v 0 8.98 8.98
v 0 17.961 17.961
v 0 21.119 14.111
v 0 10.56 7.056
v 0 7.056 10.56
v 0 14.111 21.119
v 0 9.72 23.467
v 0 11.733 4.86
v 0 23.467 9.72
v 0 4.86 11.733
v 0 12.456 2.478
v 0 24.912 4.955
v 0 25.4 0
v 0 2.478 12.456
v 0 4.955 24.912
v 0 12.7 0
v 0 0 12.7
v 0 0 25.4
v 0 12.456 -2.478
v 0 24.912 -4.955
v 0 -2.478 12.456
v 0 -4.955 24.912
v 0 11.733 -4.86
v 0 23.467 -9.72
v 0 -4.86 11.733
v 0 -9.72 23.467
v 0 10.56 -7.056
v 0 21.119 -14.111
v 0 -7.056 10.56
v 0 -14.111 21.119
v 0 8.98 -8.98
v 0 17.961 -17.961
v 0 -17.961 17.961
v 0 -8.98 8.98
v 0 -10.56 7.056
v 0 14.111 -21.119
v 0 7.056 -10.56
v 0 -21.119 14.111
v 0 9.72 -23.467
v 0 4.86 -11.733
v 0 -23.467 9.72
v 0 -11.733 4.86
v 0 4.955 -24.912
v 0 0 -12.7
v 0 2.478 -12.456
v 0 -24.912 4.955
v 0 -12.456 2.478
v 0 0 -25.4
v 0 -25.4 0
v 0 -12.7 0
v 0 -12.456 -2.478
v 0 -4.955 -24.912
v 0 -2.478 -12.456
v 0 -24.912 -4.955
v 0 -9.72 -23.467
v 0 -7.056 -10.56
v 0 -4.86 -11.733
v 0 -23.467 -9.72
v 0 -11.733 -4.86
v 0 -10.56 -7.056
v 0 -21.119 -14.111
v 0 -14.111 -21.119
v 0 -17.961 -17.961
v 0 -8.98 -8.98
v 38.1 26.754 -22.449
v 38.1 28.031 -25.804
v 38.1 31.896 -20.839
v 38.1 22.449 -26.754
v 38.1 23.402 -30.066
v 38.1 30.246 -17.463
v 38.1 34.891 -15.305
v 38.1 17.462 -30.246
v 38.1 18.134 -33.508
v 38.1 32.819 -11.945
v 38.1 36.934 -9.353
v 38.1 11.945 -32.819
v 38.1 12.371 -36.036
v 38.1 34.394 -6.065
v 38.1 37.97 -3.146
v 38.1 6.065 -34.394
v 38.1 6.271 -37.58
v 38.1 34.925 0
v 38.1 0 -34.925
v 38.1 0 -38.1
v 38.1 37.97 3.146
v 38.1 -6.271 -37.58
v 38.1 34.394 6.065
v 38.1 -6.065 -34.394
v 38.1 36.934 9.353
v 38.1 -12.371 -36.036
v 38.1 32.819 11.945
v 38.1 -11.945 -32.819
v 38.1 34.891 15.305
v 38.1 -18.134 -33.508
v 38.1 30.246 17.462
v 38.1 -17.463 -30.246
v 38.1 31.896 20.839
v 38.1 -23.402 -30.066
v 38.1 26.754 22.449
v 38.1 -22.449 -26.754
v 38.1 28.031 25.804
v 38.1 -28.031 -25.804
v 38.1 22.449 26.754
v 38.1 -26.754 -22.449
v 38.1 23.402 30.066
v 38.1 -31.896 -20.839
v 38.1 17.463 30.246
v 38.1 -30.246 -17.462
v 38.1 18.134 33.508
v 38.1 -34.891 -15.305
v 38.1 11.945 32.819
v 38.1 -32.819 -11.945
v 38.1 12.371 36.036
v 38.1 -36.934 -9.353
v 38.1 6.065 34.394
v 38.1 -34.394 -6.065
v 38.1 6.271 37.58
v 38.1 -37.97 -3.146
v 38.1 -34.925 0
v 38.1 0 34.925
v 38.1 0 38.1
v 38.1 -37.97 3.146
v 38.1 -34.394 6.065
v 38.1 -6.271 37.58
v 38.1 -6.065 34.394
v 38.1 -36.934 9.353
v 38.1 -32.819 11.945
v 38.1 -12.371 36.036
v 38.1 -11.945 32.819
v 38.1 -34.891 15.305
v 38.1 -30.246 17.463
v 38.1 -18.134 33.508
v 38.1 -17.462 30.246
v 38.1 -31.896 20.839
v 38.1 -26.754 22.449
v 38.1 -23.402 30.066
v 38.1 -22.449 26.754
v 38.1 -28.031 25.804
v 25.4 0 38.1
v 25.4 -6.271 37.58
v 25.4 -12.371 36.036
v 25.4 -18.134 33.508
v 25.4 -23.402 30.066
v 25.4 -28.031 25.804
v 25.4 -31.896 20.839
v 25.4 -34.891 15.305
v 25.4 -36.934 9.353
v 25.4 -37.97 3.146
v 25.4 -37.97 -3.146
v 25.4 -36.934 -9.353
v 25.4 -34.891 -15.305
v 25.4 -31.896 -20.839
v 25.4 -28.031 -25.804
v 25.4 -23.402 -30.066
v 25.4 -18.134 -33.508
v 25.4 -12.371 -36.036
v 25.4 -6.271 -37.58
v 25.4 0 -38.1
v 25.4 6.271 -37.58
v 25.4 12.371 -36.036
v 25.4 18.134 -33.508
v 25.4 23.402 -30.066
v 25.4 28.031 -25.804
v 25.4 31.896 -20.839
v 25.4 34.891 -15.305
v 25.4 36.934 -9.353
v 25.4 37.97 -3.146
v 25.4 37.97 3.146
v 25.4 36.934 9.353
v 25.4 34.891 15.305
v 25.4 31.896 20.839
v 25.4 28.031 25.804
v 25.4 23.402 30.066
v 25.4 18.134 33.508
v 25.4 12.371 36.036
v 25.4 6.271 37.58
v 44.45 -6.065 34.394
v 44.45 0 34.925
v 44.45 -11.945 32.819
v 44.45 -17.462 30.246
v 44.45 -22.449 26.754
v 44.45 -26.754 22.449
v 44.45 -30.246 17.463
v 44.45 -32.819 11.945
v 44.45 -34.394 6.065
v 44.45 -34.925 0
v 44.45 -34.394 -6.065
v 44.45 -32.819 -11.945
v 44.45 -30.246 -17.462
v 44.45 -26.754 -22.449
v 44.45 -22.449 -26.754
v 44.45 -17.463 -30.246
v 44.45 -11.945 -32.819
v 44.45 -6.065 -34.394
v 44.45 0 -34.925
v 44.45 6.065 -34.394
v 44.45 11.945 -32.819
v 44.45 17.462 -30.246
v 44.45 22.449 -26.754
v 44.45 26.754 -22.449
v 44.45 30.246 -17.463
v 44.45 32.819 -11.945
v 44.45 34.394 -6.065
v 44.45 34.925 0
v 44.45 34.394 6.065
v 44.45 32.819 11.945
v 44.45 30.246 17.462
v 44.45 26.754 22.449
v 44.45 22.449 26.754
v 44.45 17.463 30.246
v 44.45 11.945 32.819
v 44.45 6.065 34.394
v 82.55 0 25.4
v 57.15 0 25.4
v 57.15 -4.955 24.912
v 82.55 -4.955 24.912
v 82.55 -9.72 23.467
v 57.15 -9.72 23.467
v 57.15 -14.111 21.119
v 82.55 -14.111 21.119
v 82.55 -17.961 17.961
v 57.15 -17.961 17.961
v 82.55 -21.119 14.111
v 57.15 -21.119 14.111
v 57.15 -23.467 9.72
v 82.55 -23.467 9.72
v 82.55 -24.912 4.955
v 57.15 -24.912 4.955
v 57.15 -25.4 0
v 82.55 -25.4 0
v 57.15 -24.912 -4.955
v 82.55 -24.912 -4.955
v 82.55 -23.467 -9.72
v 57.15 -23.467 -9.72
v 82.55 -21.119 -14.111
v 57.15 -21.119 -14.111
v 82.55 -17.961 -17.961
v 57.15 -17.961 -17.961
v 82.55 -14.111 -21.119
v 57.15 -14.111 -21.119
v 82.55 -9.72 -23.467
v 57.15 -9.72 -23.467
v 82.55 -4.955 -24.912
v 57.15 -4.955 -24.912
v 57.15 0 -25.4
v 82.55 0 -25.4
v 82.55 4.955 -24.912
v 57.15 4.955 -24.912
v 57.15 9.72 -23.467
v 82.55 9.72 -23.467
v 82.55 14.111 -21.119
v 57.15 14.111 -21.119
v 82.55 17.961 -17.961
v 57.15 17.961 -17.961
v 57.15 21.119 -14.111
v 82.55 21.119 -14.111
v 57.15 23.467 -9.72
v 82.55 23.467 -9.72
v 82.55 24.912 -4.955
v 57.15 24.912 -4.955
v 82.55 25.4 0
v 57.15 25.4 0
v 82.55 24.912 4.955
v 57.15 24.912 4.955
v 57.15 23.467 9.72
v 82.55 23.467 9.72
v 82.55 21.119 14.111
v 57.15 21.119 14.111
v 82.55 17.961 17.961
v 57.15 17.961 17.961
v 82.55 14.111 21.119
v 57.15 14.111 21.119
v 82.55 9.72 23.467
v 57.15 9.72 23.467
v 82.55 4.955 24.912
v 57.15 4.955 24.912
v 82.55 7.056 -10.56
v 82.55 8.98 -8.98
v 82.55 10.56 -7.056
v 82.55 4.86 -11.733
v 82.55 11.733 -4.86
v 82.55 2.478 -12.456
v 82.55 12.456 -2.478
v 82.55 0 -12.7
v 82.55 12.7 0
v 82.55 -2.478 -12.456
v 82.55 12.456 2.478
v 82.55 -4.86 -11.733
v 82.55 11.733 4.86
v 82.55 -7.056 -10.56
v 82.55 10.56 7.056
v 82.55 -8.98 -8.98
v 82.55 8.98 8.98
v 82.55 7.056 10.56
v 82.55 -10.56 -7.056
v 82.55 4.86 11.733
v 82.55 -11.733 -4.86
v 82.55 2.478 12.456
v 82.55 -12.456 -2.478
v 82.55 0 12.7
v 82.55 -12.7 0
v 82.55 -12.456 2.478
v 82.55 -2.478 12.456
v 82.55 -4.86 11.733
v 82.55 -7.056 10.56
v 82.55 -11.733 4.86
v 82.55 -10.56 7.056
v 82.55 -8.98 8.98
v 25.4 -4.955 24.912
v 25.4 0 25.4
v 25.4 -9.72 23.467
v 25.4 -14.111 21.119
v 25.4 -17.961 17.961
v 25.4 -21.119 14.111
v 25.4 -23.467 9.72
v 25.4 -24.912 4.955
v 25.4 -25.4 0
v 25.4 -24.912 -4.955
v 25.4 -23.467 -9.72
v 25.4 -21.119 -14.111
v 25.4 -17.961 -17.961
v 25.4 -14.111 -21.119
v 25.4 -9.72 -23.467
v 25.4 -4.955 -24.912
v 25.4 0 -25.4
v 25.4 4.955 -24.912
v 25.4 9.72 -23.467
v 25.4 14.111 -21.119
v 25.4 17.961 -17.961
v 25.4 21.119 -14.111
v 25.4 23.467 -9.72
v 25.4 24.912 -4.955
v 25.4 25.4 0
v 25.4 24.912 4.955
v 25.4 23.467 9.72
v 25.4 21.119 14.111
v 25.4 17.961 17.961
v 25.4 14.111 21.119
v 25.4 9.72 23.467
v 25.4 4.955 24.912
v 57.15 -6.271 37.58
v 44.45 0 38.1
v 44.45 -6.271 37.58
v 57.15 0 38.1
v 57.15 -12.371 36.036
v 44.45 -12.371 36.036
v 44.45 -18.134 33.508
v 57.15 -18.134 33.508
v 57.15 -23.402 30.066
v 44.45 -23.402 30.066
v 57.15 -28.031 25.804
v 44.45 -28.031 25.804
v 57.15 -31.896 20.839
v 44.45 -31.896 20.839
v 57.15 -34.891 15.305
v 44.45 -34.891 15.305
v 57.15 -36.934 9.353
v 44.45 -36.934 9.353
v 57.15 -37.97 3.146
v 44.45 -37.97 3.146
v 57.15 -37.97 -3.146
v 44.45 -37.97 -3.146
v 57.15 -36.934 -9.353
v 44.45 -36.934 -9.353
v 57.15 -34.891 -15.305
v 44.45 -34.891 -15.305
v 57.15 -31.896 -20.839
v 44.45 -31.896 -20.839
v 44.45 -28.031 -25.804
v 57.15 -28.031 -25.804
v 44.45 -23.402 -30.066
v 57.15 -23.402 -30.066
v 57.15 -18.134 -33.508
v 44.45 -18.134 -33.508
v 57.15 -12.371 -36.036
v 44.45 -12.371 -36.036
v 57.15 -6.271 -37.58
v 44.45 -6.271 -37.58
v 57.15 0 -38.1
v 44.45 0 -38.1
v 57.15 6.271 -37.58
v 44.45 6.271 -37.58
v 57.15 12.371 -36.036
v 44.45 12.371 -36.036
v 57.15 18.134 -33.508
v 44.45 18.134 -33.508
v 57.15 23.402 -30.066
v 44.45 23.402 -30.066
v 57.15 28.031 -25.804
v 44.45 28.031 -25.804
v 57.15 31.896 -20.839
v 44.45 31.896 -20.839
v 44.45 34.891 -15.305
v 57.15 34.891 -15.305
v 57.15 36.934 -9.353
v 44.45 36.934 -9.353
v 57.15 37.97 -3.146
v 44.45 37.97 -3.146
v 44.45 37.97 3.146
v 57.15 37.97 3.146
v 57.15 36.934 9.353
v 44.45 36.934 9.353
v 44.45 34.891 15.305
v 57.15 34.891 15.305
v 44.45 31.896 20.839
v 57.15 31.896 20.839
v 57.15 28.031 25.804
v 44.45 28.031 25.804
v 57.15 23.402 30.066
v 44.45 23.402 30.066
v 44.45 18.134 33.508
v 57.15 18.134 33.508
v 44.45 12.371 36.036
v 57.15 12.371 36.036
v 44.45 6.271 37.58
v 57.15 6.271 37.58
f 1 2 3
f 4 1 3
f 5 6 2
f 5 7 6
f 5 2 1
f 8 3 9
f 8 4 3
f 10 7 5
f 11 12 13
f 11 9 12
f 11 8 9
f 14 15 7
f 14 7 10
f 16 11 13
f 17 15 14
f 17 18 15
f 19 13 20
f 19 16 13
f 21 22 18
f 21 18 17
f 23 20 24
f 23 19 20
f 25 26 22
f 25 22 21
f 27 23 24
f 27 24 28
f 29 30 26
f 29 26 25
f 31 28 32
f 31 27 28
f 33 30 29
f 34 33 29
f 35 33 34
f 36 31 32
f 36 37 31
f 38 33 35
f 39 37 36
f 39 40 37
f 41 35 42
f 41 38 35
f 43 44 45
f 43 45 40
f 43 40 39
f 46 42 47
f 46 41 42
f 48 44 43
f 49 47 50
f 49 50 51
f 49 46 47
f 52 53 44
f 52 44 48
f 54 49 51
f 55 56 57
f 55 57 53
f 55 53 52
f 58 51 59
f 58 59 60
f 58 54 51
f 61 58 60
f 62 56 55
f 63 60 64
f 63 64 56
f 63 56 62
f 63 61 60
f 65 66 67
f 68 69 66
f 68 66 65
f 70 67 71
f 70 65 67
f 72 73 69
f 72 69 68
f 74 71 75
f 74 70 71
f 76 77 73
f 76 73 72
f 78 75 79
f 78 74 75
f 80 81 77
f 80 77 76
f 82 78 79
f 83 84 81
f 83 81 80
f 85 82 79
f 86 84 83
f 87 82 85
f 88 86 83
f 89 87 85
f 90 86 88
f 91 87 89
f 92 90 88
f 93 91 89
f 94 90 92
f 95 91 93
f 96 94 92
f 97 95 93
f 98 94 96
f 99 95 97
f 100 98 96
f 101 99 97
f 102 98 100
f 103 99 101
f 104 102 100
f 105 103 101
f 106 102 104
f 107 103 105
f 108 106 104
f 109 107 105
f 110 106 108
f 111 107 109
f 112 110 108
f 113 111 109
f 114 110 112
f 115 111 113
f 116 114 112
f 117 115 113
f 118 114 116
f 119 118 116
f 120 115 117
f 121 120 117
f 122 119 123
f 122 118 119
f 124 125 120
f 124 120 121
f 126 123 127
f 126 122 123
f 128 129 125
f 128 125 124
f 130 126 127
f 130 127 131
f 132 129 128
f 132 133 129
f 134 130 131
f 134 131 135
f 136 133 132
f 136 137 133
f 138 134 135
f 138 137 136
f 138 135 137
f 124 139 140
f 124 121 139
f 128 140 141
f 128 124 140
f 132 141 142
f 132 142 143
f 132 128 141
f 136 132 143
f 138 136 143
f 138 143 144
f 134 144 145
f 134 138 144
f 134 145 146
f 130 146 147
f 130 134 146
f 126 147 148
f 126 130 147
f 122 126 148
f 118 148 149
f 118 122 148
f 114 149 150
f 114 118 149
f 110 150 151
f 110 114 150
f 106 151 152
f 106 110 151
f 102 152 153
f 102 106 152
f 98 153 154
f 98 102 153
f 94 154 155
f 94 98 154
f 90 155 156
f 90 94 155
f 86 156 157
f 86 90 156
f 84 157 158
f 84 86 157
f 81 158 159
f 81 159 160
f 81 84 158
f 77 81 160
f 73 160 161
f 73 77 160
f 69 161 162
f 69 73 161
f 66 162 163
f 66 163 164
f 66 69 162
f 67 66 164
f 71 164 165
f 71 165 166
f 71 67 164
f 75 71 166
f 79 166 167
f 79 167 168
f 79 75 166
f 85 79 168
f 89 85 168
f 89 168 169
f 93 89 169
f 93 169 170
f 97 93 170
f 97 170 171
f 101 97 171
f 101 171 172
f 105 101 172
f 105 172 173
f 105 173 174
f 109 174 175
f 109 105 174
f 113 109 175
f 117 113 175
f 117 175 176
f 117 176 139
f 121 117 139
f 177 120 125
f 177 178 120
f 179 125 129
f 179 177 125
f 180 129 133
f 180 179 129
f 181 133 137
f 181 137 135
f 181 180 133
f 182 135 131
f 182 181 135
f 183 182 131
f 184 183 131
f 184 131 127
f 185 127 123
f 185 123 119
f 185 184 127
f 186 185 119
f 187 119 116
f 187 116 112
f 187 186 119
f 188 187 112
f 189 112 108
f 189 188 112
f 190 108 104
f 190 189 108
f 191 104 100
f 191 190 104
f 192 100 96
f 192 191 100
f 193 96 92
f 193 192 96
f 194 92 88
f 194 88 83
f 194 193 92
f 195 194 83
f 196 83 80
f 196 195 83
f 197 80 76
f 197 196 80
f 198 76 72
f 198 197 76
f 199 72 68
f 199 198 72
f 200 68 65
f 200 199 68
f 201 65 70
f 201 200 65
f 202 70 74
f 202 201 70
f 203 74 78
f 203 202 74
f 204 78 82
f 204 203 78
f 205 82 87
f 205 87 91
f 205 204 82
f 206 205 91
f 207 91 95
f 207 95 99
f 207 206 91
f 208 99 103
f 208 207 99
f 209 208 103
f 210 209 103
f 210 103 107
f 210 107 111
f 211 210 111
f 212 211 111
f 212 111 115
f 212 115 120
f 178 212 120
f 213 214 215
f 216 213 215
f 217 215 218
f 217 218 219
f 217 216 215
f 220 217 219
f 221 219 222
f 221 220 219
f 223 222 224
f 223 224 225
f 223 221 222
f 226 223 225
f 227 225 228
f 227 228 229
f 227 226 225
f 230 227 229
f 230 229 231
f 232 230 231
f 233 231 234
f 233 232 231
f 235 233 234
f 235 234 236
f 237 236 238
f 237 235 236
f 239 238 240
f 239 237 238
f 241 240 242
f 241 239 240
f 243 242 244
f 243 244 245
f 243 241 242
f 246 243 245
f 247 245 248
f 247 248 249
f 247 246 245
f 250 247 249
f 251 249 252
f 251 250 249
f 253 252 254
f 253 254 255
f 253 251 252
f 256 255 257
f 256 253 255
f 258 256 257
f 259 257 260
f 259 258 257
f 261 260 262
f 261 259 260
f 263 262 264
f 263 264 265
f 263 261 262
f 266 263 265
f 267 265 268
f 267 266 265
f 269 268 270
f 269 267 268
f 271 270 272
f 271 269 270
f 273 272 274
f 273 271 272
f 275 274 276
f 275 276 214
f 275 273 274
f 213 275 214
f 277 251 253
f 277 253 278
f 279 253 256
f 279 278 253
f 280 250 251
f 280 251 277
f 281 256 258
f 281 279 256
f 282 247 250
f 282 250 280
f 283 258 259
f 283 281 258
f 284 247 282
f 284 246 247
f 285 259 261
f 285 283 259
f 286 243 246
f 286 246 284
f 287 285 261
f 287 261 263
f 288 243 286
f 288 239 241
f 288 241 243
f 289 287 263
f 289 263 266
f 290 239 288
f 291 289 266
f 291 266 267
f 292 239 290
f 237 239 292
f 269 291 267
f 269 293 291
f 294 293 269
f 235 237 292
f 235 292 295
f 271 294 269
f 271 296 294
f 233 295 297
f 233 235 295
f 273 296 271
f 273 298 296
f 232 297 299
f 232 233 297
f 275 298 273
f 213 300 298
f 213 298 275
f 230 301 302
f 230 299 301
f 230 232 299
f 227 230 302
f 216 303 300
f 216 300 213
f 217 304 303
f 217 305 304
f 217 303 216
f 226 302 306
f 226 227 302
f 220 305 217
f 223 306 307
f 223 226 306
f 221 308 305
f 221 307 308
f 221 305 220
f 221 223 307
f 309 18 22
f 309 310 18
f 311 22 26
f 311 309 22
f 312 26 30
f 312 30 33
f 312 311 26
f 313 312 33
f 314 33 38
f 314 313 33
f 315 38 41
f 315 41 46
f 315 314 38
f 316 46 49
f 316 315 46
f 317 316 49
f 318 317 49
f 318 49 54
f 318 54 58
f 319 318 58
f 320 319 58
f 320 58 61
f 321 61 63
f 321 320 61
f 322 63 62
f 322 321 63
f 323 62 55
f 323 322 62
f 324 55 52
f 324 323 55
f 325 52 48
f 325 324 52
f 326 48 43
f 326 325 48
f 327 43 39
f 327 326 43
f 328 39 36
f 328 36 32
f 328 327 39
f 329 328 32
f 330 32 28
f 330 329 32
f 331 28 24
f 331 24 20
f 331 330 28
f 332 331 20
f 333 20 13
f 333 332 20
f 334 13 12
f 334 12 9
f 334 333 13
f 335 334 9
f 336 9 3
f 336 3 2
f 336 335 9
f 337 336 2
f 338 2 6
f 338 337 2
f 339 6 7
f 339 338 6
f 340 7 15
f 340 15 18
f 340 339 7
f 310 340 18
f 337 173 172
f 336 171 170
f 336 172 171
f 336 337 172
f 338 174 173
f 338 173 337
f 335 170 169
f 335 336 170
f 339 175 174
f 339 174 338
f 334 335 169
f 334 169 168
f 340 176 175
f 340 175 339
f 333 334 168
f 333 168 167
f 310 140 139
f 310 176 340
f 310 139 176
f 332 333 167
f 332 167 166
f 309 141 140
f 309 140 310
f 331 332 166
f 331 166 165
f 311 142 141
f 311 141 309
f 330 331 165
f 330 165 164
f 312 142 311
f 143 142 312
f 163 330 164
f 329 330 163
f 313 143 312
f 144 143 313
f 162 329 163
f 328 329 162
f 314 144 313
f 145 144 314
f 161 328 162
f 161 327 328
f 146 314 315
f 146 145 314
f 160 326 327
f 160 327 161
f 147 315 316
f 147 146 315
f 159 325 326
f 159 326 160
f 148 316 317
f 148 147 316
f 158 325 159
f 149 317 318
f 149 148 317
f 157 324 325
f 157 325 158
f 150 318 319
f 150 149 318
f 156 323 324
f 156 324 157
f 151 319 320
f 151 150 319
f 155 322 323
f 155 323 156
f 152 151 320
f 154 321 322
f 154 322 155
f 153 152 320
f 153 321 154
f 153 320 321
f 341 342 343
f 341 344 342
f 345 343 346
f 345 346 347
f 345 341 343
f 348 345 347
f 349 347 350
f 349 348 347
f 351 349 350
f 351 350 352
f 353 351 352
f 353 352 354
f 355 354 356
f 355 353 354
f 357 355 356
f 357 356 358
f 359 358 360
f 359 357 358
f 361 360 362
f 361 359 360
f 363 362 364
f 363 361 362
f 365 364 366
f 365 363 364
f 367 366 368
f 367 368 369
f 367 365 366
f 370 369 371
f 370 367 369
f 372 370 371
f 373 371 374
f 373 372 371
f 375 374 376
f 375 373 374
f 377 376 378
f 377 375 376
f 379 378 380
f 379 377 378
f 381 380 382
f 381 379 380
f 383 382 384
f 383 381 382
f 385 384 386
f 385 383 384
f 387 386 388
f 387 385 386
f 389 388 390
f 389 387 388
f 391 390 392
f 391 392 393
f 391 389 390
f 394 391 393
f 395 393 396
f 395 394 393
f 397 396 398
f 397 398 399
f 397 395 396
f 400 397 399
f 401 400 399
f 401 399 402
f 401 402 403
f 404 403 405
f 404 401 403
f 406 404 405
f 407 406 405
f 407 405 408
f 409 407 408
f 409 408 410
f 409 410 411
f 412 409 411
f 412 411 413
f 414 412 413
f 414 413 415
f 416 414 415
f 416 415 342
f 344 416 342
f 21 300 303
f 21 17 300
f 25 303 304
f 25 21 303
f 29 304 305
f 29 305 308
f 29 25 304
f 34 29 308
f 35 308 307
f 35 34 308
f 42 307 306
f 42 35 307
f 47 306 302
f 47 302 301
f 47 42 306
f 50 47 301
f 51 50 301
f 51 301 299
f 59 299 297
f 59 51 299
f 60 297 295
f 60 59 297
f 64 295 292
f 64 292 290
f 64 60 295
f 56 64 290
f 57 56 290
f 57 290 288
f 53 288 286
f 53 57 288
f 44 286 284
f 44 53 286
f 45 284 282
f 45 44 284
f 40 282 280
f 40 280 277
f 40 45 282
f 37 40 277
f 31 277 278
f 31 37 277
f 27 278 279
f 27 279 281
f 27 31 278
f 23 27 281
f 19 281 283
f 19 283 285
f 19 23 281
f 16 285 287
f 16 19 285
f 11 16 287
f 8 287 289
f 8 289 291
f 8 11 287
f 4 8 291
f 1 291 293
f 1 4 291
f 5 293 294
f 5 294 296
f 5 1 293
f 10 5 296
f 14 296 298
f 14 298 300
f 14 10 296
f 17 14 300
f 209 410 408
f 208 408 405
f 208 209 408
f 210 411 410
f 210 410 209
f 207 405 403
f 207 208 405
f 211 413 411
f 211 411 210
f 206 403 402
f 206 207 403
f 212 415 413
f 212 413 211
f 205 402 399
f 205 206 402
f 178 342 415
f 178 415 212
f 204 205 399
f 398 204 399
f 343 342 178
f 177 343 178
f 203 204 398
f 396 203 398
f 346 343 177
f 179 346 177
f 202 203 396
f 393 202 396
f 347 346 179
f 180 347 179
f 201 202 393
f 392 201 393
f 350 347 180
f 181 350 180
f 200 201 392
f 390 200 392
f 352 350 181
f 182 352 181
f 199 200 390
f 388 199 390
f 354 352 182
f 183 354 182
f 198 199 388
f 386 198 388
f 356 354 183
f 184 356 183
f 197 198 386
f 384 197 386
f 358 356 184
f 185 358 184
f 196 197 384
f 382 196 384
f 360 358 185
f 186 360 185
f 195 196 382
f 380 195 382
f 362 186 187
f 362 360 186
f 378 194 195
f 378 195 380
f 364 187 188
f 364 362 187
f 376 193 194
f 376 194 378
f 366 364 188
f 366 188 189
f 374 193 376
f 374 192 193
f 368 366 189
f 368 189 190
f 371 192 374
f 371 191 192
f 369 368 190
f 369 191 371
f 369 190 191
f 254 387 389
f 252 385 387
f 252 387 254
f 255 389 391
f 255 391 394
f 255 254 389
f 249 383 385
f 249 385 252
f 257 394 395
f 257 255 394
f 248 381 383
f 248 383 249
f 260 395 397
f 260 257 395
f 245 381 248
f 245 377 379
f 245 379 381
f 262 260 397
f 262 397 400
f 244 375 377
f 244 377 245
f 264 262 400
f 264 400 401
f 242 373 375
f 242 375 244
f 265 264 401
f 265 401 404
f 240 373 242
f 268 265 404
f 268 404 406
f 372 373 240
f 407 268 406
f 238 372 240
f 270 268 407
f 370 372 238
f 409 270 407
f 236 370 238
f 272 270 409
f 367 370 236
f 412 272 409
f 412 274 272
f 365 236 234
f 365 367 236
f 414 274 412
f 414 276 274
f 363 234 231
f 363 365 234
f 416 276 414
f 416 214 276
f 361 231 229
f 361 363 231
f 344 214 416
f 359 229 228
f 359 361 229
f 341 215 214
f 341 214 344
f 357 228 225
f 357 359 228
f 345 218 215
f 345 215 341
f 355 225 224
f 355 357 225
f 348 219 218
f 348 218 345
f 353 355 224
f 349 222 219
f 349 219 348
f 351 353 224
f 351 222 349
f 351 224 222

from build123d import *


with BuildPart() as part:
    # Sketch1 → Base-Revolve (revolve)
    with BuildSketch(Plane.XY, mode=Mode.PRIVATE) as base_revolve_sk:
        Polygon((0, 12.7), (0, 25.4), (25.4, 25.4), (25.4, 38.1), (38.1, 38.1), (38.1, 34.925), (44.45, 34.925), (44.45, 38.1), (57.15, 38.1), (57.15, 25.4), (82.55, 25.4), (82.55, 12.7), align=None)
    revolve(base_revolve_sk.sketch.rotate(Axis((0, 0, 0), (1, 0, 0)), 90), axis=Axis((0, 0, 0), (1, 0, 0)))


solid = part.part
